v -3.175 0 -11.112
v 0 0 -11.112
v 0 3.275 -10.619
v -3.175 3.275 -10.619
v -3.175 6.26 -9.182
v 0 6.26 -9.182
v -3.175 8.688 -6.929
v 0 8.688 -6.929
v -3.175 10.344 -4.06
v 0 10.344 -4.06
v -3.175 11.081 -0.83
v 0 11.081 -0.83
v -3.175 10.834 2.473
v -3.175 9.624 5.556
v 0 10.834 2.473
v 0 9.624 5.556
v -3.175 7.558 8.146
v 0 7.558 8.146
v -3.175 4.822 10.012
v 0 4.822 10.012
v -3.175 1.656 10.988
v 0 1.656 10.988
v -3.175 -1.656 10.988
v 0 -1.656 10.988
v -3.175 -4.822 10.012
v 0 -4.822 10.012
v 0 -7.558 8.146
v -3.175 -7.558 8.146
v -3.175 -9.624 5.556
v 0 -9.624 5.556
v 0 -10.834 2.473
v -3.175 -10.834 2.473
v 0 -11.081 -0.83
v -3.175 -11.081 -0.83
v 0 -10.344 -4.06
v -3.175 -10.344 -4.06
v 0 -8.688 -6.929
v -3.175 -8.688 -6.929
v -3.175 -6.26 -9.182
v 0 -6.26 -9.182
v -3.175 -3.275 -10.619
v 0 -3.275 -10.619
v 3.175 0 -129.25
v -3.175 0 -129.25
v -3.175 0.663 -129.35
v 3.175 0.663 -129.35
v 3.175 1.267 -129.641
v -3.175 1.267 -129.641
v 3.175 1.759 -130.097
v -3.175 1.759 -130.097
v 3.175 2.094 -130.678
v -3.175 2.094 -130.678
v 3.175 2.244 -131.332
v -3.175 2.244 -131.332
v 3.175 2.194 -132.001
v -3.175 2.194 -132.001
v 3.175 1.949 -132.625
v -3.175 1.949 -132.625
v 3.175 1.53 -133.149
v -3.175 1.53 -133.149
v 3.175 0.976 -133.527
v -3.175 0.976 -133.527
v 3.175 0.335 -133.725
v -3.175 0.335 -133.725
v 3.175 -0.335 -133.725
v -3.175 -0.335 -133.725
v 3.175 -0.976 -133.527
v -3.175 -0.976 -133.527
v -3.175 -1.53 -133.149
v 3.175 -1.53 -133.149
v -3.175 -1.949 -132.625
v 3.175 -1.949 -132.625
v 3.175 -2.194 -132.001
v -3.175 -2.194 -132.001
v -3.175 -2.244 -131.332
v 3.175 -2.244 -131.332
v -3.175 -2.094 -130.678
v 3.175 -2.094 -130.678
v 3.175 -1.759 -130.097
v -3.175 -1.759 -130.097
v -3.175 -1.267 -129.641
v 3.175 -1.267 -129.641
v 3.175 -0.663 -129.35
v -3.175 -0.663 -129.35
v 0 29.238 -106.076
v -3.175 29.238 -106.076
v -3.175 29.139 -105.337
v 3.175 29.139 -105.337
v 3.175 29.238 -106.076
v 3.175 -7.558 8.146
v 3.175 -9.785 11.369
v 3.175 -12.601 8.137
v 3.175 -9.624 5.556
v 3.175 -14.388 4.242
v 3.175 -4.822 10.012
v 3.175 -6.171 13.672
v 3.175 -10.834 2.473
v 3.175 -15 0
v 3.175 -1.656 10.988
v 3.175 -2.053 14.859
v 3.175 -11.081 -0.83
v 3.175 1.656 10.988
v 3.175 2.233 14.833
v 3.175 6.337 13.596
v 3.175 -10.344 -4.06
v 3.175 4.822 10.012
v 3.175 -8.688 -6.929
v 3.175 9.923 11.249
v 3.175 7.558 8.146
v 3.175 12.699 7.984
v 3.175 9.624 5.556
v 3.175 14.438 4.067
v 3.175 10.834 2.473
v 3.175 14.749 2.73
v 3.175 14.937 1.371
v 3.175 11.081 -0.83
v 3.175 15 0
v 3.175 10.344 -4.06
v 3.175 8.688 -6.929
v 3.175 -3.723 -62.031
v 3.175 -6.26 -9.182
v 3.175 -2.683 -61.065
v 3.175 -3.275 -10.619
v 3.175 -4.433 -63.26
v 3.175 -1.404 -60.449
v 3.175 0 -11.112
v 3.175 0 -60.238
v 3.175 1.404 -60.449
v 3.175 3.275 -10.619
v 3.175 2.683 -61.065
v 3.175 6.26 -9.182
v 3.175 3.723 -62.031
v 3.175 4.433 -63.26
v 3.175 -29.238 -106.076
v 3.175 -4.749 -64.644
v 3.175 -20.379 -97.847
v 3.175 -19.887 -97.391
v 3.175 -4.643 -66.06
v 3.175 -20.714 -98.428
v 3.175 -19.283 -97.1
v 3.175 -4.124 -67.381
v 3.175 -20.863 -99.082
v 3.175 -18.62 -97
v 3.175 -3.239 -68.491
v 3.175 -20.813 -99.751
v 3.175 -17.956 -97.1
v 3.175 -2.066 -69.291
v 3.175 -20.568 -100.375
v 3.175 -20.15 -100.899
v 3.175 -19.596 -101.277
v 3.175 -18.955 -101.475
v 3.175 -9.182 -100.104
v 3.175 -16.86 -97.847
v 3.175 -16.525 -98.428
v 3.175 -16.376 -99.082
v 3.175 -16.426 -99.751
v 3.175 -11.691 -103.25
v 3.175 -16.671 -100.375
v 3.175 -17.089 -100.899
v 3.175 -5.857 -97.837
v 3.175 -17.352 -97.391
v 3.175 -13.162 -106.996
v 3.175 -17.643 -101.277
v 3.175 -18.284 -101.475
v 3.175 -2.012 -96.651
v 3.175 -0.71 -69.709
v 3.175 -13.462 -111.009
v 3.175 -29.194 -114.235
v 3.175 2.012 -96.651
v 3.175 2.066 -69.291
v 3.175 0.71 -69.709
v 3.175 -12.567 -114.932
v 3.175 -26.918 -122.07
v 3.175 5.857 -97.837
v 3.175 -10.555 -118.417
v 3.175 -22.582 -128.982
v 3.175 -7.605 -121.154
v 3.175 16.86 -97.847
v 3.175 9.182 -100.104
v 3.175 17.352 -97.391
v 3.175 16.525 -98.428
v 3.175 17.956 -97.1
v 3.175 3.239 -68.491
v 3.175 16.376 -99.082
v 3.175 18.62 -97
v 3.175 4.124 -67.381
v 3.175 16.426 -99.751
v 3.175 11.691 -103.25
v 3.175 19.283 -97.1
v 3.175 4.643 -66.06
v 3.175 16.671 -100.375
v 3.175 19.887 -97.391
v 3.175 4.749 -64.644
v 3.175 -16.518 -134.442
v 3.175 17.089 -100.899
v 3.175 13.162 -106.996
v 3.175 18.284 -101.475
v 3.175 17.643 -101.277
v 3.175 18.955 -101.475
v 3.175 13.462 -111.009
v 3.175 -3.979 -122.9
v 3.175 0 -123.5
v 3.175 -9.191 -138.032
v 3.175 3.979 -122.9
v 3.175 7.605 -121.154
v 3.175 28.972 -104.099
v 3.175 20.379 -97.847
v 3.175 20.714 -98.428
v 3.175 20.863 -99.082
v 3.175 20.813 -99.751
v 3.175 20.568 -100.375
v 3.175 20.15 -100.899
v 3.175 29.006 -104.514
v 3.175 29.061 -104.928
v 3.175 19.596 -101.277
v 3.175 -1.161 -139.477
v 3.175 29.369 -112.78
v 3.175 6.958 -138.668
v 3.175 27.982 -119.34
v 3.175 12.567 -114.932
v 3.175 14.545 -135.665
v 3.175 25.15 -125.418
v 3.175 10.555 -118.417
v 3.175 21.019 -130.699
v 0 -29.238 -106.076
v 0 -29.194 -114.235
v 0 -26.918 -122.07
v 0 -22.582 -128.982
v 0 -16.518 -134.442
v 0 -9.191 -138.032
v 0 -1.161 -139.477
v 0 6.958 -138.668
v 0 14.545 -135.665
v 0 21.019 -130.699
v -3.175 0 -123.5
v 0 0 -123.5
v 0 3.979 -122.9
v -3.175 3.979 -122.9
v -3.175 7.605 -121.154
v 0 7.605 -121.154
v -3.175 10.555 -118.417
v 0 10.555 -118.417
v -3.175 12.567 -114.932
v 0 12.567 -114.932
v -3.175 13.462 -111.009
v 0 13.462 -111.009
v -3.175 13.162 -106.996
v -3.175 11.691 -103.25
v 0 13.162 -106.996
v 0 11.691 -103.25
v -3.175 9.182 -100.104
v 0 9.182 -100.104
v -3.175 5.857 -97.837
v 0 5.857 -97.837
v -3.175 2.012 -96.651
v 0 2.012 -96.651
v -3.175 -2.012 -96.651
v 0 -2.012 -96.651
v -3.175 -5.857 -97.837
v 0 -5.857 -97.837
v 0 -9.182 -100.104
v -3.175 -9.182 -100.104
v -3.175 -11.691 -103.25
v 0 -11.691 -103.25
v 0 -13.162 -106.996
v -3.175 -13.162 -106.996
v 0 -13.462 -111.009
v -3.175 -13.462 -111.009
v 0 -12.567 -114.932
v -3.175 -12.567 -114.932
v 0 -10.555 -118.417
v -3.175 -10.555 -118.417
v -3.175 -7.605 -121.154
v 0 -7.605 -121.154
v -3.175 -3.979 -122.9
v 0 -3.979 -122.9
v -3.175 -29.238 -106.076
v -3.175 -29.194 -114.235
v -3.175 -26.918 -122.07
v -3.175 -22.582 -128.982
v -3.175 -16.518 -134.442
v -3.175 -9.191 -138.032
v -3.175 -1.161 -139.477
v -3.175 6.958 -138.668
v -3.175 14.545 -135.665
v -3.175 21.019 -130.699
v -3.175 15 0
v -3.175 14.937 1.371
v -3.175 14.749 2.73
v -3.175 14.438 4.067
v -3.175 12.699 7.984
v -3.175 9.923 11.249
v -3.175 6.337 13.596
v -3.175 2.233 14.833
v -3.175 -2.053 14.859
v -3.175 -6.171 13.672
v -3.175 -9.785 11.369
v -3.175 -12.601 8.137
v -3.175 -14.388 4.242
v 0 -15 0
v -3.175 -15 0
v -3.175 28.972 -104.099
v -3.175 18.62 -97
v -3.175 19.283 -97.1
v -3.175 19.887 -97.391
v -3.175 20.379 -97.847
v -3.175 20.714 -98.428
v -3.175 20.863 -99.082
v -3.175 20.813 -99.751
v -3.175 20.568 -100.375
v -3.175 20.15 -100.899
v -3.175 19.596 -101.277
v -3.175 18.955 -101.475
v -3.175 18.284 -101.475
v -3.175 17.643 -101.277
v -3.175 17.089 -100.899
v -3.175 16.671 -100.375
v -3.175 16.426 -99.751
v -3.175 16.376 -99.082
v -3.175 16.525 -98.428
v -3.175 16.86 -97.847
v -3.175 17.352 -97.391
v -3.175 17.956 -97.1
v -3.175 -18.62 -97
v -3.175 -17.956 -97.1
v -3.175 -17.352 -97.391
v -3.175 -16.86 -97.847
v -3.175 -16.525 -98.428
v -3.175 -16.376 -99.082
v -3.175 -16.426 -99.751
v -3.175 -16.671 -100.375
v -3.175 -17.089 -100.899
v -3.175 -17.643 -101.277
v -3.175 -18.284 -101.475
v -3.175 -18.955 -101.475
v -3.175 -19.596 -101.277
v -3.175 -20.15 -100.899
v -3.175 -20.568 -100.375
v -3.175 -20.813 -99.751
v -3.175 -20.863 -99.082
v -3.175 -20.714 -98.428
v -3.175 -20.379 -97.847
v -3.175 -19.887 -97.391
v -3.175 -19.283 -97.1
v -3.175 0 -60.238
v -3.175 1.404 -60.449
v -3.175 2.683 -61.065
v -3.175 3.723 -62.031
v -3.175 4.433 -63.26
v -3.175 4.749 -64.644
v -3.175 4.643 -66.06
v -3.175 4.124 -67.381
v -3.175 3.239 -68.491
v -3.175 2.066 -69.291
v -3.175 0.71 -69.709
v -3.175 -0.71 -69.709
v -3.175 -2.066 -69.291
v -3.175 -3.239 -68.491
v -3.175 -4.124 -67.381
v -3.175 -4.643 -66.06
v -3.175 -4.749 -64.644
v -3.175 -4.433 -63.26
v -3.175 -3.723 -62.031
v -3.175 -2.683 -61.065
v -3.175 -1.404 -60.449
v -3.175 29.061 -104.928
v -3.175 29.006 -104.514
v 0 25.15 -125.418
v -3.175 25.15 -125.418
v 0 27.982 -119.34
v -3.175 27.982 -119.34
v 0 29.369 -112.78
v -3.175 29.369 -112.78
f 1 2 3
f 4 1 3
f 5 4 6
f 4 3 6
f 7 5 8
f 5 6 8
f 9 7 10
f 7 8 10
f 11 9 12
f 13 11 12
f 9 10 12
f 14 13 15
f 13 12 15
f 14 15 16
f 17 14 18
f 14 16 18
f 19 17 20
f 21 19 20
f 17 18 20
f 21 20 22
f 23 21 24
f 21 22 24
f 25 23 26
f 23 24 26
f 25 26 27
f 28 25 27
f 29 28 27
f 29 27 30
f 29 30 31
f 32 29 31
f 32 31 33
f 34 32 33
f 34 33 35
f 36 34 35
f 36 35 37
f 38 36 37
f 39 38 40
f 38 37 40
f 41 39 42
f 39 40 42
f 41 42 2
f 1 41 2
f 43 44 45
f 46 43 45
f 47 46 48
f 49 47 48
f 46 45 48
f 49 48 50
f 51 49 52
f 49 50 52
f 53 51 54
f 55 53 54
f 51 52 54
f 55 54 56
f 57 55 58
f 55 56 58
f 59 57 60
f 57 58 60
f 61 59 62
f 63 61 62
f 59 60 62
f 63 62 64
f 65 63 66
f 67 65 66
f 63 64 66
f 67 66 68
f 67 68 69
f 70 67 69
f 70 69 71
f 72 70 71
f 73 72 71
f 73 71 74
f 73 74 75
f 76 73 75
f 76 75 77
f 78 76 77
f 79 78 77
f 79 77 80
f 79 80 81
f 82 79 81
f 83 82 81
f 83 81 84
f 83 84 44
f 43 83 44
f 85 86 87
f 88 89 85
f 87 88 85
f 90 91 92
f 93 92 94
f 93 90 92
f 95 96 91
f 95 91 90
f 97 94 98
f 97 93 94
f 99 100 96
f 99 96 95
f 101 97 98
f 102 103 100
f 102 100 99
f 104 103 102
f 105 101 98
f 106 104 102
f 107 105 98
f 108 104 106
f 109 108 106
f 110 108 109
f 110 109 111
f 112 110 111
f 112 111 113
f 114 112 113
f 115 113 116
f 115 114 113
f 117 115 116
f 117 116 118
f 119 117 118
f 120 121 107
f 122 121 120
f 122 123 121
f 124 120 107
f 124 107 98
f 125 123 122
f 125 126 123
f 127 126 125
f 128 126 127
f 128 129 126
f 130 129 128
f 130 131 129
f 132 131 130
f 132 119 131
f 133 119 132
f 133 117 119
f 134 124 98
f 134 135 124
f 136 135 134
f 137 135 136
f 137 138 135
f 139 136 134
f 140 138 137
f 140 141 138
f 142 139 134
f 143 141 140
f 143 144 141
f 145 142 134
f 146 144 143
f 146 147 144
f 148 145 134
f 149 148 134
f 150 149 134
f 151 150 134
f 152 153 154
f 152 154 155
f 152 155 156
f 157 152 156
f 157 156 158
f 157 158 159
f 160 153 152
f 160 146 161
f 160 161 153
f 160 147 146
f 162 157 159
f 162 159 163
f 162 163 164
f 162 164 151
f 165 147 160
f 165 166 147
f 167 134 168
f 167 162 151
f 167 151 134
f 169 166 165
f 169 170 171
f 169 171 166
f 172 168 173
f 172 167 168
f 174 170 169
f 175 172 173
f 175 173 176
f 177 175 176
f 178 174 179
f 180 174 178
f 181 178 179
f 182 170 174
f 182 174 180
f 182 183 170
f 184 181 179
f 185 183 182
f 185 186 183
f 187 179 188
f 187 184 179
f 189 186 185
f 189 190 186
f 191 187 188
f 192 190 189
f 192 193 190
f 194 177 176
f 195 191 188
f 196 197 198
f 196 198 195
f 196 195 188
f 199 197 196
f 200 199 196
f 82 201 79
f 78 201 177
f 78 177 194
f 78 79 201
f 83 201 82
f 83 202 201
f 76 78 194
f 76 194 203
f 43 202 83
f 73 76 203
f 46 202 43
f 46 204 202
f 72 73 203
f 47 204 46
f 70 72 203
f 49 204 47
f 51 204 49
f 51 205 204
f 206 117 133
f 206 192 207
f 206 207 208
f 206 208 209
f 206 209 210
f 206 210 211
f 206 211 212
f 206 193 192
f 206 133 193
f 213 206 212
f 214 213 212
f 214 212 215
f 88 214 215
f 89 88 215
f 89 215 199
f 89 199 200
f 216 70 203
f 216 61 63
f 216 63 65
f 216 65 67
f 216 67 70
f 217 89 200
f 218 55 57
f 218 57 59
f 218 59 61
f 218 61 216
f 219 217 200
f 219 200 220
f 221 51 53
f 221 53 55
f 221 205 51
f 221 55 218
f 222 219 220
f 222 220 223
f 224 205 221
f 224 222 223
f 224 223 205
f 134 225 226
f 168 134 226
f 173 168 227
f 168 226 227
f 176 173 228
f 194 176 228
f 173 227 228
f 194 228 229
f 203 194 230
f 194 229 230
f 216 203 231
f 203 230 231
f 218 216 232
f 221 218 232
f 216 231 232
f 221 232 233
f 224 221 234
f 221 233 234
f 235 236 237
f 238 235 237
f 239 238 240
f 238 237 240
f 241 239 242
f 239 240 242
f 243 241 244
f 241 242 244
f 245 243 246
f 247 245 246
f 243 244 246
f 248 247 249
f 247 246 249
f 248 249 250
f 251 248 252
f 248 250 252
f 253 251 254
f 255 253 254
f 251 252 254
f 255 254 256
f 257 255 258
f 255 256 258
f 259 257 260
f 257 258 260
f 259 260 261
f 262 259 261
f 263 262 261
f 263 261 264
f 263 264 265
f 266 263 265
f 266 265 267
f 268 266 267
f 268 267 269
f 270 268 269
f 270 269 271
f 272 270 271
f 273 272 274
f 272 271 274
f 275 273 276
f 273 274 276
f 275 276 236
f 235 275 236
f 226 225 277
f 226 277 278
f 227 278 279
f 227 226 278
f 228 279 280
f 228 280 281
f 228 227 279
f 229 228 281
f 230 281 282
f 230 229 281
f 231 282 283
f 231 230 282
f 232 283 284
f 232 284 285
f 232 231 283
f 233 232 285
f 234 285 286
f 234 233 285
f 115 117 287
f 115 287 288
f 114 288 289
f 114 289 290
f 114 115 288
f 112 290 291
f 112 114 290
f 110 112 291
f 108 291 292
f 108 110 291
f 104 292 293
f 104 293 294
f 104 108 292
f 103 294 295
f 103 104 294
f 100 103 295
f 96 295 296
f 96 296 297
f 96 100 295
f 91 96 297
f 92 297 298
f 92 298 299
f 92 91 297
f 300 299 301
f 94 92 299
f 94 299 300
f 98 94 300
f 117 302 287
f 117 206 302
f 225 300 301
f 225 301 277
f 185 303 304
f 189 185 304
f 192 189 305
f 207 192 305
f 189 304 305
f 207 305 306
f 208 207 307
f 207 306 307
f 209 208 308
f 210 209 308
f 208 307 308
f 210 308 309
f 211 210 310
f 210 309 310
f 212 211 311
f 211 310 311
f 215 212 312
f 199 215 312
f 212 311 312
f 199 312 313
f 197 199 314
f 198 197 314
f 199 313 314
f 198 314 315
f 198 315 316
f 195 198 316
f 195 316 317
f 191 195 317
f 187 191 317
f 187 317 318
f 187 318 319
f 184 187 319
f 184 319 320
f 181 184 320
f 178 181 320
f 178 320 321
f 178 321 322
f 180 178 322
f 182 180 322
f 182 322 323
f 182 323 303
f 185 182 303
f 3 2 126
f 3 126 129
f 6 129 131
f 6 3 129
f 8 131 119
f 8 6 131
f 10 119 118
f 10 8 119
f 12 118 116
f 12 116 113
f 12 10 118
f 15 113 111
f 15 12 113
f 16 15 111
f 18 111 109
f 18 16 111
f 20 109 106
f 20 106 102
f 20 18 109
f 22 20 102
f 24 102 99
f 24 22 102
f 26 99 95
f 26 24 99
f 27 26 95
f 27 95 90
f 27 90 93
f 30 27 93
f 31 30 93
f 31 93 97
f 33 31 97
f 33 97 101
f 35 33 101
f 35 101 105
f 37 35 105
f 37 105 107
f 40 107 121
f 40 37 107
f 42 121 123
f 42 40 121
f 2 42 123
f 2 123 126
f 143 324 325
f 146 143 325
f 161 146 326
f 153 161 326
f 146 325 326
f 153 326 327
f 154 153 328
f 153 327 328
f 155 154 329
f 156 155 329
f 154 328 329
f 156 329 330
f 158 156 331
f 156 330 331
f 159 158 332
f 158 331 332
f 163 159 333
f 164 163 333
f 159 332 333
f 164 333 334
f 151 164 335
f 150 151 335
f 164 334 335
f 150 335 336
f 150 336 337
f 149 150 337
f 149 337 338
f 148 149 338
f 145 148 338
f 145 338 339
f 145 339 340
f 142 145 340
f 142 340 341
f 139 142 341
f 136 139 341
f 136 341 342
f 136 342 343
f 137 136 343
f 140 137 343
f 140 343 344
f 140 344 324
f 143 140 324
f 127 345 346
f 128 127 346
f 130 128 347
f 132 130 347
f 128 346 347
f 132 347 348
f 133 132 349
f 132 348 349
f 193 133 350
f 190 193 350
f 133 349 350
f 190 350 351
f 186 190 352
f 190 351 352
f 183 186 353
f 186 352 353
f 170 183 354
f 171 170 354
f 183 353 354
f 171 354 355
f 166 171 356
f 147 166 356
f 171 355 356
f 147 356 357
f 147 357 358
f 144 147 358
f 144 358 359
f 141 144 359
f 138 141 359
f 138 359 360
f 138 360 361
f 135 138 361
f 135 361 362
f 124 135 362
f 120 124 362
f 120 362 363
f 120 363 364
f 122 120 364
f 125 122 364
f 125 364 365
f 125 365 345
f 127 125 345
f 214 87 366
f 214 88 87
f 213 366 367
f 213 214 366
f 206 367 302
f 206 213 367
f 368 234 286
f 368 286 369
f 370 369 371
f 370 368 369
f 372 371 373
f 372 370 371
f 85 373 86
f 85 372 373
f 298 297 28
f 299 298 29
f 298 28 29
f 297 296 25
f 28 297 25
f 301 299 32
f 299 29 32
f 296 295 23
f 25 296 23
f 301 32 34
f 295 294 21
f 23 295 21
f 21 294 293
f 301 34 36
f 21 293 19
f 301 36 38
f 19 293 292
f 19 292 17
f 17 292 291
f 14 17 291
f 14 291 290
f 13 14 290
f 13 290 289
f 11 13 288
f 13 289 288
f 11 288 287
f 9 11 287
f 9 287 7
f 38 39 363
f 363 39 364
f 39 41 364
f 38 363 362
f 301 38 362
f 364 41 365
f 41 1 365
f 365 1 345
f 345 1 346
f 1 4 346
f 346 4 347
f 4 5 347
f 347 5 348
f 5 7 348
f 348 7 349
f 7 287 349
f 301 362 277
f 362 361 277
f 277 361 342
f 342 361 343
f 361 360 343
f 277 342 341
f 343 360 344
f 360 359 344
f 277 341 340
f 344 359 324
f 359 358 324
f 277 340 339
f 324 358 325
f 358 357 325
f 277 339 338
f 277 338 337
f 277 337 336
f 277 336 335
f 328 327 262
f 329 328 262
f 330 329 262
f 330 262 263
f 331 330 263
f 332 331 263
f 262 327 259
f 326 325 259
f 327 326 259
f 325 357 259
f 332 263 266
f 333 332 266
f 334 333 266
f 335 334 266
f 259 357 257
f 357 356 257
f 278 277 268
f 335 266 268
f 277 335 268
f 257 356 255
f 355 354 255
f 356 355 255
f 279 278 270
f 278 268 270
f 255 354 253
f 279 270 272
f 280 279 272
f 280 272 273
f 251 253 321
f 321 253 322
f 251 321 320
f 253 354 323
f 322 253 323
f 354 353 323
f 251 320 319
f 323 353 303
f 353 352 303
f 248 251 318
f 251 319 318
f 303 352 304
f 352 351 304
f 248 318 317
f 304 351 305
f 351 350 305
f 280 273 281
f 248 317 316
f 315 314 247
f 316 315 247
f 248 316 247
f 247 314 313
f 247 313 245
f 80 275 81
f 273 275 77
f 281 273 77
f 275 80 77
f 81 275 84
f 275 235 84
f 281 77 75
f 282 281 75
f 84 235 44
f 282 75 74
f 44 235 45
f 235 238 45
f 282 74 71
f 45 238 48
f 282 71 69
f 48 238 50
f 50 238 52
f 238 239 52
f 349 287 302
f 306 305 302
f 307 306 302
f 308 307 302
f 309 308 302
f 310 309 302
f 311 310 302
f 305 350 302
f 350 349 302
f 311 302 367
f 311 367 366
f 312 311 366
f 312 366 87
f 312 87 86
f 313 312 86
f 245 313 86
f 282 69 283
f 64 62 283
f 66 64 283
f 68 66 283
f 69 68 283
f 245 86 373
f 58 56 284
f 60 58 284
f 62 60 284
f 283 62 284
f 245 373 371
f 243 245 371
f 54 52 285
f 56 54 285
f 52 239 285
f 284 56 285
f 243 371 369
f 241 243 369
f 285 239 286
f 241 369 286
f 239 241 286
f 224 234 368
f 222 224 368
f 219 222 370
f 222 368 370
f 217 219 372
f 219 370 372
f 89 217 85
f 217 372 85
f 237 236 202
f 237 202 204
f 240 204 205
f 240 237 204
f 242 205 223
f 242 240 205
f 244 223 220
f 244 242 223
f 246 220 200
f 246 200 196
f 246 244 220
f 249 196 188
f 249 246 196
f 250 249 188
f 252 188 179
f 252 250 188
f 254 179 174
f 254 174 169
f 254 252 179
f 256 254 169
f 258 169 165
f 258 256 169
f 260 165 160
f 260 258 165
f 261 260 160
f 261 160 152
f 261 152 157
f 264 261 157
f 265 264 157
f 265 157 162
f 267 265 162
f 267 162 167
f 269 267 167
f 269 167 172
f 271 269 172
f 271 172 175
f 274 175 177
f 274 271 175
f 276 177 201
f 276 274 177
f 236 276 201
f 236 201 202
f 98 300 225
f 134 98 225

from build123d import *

# Parameters (mm, degrees)
SKETCH1_R                  = 11.1125
SKETCH1_R_2                = 13.5
BOSS_EXTRUDE1_DEPTH        = 3.175
M4_CLEARANCE_HOLE1_D       = 4.5
F_3_8_0_3750_DOWEL_HOLE1_D = 9.525


with BuildPart() as part:
    # Sketch1 → Boss-Extrude1 (new, symmetric)
    with BuildSketch(Plane(origin=(0, 0, 0), x_dir=(0, 0, -1), z_dir=(1, 0, 0))):
        with BuildLine():
            Line((104.098699929, 28.972456546), (0, 15))
            ThreePointArc((0, 15), (-2.052648501, 14.858890744), (-4.066677309, 14.438217884))
            ThreePointArc((-4.066677309, 14.438217884), (-14.858890744, -2.052648501), (0, -15))
            Line((0, -15), (106.075609583, -29.237803609))
            ThreePointArc((106.075609583, -29.237803609), (136.491140548, -12.979579055), (130.699290202, 21.018786481))
            ThreePointArc((130.699290202, 21.018786481), (119.340095093, 27.982362725), (106.075609583, 29.237803609))
            Line((106.075609583, 29.237803609), (105.337220563, 29.1386947))
            ThreePointArc((105.337220563, 29.1386947), (104.721310863, 29.030612592), (104.098699929, 28.972456546))
        make_face()
        Circle(SKETCH1_R, mode=Mode.SUBTRACT)
        with Locations((110, 0)):
            Circle(SKETCH1_R_2, mode=Mode.SUBTRACT)
    extrude(amount=BOSS_EXTRUDE1_DEPTH, both=True)

    # M4 Clearance Hole1 (through all)
    with Locations(Plane(origin=(3.175, 0, 0), x_dir=(0, 0, -1), z_dir=(1, 0, 0))):
        with Locations((99.25, 18.619546181), (131.5, 0), (99.25, -18.619546181)):
            Hole(M4_CLEARANCE_HOLE1_D / 2)

    # 3/8 (0.3750) Dowel Hole1 (through all)
    with Locations(Plane(origin=(3.175, 0, 0), x_dir=(0, 0, -1), z_dir=(1, 0, 0))):
        with Locations((65, 0)):
            Hole(F_3_8_0_3750_DOWEL_HOLE1_D / 2)


solid = part.part
